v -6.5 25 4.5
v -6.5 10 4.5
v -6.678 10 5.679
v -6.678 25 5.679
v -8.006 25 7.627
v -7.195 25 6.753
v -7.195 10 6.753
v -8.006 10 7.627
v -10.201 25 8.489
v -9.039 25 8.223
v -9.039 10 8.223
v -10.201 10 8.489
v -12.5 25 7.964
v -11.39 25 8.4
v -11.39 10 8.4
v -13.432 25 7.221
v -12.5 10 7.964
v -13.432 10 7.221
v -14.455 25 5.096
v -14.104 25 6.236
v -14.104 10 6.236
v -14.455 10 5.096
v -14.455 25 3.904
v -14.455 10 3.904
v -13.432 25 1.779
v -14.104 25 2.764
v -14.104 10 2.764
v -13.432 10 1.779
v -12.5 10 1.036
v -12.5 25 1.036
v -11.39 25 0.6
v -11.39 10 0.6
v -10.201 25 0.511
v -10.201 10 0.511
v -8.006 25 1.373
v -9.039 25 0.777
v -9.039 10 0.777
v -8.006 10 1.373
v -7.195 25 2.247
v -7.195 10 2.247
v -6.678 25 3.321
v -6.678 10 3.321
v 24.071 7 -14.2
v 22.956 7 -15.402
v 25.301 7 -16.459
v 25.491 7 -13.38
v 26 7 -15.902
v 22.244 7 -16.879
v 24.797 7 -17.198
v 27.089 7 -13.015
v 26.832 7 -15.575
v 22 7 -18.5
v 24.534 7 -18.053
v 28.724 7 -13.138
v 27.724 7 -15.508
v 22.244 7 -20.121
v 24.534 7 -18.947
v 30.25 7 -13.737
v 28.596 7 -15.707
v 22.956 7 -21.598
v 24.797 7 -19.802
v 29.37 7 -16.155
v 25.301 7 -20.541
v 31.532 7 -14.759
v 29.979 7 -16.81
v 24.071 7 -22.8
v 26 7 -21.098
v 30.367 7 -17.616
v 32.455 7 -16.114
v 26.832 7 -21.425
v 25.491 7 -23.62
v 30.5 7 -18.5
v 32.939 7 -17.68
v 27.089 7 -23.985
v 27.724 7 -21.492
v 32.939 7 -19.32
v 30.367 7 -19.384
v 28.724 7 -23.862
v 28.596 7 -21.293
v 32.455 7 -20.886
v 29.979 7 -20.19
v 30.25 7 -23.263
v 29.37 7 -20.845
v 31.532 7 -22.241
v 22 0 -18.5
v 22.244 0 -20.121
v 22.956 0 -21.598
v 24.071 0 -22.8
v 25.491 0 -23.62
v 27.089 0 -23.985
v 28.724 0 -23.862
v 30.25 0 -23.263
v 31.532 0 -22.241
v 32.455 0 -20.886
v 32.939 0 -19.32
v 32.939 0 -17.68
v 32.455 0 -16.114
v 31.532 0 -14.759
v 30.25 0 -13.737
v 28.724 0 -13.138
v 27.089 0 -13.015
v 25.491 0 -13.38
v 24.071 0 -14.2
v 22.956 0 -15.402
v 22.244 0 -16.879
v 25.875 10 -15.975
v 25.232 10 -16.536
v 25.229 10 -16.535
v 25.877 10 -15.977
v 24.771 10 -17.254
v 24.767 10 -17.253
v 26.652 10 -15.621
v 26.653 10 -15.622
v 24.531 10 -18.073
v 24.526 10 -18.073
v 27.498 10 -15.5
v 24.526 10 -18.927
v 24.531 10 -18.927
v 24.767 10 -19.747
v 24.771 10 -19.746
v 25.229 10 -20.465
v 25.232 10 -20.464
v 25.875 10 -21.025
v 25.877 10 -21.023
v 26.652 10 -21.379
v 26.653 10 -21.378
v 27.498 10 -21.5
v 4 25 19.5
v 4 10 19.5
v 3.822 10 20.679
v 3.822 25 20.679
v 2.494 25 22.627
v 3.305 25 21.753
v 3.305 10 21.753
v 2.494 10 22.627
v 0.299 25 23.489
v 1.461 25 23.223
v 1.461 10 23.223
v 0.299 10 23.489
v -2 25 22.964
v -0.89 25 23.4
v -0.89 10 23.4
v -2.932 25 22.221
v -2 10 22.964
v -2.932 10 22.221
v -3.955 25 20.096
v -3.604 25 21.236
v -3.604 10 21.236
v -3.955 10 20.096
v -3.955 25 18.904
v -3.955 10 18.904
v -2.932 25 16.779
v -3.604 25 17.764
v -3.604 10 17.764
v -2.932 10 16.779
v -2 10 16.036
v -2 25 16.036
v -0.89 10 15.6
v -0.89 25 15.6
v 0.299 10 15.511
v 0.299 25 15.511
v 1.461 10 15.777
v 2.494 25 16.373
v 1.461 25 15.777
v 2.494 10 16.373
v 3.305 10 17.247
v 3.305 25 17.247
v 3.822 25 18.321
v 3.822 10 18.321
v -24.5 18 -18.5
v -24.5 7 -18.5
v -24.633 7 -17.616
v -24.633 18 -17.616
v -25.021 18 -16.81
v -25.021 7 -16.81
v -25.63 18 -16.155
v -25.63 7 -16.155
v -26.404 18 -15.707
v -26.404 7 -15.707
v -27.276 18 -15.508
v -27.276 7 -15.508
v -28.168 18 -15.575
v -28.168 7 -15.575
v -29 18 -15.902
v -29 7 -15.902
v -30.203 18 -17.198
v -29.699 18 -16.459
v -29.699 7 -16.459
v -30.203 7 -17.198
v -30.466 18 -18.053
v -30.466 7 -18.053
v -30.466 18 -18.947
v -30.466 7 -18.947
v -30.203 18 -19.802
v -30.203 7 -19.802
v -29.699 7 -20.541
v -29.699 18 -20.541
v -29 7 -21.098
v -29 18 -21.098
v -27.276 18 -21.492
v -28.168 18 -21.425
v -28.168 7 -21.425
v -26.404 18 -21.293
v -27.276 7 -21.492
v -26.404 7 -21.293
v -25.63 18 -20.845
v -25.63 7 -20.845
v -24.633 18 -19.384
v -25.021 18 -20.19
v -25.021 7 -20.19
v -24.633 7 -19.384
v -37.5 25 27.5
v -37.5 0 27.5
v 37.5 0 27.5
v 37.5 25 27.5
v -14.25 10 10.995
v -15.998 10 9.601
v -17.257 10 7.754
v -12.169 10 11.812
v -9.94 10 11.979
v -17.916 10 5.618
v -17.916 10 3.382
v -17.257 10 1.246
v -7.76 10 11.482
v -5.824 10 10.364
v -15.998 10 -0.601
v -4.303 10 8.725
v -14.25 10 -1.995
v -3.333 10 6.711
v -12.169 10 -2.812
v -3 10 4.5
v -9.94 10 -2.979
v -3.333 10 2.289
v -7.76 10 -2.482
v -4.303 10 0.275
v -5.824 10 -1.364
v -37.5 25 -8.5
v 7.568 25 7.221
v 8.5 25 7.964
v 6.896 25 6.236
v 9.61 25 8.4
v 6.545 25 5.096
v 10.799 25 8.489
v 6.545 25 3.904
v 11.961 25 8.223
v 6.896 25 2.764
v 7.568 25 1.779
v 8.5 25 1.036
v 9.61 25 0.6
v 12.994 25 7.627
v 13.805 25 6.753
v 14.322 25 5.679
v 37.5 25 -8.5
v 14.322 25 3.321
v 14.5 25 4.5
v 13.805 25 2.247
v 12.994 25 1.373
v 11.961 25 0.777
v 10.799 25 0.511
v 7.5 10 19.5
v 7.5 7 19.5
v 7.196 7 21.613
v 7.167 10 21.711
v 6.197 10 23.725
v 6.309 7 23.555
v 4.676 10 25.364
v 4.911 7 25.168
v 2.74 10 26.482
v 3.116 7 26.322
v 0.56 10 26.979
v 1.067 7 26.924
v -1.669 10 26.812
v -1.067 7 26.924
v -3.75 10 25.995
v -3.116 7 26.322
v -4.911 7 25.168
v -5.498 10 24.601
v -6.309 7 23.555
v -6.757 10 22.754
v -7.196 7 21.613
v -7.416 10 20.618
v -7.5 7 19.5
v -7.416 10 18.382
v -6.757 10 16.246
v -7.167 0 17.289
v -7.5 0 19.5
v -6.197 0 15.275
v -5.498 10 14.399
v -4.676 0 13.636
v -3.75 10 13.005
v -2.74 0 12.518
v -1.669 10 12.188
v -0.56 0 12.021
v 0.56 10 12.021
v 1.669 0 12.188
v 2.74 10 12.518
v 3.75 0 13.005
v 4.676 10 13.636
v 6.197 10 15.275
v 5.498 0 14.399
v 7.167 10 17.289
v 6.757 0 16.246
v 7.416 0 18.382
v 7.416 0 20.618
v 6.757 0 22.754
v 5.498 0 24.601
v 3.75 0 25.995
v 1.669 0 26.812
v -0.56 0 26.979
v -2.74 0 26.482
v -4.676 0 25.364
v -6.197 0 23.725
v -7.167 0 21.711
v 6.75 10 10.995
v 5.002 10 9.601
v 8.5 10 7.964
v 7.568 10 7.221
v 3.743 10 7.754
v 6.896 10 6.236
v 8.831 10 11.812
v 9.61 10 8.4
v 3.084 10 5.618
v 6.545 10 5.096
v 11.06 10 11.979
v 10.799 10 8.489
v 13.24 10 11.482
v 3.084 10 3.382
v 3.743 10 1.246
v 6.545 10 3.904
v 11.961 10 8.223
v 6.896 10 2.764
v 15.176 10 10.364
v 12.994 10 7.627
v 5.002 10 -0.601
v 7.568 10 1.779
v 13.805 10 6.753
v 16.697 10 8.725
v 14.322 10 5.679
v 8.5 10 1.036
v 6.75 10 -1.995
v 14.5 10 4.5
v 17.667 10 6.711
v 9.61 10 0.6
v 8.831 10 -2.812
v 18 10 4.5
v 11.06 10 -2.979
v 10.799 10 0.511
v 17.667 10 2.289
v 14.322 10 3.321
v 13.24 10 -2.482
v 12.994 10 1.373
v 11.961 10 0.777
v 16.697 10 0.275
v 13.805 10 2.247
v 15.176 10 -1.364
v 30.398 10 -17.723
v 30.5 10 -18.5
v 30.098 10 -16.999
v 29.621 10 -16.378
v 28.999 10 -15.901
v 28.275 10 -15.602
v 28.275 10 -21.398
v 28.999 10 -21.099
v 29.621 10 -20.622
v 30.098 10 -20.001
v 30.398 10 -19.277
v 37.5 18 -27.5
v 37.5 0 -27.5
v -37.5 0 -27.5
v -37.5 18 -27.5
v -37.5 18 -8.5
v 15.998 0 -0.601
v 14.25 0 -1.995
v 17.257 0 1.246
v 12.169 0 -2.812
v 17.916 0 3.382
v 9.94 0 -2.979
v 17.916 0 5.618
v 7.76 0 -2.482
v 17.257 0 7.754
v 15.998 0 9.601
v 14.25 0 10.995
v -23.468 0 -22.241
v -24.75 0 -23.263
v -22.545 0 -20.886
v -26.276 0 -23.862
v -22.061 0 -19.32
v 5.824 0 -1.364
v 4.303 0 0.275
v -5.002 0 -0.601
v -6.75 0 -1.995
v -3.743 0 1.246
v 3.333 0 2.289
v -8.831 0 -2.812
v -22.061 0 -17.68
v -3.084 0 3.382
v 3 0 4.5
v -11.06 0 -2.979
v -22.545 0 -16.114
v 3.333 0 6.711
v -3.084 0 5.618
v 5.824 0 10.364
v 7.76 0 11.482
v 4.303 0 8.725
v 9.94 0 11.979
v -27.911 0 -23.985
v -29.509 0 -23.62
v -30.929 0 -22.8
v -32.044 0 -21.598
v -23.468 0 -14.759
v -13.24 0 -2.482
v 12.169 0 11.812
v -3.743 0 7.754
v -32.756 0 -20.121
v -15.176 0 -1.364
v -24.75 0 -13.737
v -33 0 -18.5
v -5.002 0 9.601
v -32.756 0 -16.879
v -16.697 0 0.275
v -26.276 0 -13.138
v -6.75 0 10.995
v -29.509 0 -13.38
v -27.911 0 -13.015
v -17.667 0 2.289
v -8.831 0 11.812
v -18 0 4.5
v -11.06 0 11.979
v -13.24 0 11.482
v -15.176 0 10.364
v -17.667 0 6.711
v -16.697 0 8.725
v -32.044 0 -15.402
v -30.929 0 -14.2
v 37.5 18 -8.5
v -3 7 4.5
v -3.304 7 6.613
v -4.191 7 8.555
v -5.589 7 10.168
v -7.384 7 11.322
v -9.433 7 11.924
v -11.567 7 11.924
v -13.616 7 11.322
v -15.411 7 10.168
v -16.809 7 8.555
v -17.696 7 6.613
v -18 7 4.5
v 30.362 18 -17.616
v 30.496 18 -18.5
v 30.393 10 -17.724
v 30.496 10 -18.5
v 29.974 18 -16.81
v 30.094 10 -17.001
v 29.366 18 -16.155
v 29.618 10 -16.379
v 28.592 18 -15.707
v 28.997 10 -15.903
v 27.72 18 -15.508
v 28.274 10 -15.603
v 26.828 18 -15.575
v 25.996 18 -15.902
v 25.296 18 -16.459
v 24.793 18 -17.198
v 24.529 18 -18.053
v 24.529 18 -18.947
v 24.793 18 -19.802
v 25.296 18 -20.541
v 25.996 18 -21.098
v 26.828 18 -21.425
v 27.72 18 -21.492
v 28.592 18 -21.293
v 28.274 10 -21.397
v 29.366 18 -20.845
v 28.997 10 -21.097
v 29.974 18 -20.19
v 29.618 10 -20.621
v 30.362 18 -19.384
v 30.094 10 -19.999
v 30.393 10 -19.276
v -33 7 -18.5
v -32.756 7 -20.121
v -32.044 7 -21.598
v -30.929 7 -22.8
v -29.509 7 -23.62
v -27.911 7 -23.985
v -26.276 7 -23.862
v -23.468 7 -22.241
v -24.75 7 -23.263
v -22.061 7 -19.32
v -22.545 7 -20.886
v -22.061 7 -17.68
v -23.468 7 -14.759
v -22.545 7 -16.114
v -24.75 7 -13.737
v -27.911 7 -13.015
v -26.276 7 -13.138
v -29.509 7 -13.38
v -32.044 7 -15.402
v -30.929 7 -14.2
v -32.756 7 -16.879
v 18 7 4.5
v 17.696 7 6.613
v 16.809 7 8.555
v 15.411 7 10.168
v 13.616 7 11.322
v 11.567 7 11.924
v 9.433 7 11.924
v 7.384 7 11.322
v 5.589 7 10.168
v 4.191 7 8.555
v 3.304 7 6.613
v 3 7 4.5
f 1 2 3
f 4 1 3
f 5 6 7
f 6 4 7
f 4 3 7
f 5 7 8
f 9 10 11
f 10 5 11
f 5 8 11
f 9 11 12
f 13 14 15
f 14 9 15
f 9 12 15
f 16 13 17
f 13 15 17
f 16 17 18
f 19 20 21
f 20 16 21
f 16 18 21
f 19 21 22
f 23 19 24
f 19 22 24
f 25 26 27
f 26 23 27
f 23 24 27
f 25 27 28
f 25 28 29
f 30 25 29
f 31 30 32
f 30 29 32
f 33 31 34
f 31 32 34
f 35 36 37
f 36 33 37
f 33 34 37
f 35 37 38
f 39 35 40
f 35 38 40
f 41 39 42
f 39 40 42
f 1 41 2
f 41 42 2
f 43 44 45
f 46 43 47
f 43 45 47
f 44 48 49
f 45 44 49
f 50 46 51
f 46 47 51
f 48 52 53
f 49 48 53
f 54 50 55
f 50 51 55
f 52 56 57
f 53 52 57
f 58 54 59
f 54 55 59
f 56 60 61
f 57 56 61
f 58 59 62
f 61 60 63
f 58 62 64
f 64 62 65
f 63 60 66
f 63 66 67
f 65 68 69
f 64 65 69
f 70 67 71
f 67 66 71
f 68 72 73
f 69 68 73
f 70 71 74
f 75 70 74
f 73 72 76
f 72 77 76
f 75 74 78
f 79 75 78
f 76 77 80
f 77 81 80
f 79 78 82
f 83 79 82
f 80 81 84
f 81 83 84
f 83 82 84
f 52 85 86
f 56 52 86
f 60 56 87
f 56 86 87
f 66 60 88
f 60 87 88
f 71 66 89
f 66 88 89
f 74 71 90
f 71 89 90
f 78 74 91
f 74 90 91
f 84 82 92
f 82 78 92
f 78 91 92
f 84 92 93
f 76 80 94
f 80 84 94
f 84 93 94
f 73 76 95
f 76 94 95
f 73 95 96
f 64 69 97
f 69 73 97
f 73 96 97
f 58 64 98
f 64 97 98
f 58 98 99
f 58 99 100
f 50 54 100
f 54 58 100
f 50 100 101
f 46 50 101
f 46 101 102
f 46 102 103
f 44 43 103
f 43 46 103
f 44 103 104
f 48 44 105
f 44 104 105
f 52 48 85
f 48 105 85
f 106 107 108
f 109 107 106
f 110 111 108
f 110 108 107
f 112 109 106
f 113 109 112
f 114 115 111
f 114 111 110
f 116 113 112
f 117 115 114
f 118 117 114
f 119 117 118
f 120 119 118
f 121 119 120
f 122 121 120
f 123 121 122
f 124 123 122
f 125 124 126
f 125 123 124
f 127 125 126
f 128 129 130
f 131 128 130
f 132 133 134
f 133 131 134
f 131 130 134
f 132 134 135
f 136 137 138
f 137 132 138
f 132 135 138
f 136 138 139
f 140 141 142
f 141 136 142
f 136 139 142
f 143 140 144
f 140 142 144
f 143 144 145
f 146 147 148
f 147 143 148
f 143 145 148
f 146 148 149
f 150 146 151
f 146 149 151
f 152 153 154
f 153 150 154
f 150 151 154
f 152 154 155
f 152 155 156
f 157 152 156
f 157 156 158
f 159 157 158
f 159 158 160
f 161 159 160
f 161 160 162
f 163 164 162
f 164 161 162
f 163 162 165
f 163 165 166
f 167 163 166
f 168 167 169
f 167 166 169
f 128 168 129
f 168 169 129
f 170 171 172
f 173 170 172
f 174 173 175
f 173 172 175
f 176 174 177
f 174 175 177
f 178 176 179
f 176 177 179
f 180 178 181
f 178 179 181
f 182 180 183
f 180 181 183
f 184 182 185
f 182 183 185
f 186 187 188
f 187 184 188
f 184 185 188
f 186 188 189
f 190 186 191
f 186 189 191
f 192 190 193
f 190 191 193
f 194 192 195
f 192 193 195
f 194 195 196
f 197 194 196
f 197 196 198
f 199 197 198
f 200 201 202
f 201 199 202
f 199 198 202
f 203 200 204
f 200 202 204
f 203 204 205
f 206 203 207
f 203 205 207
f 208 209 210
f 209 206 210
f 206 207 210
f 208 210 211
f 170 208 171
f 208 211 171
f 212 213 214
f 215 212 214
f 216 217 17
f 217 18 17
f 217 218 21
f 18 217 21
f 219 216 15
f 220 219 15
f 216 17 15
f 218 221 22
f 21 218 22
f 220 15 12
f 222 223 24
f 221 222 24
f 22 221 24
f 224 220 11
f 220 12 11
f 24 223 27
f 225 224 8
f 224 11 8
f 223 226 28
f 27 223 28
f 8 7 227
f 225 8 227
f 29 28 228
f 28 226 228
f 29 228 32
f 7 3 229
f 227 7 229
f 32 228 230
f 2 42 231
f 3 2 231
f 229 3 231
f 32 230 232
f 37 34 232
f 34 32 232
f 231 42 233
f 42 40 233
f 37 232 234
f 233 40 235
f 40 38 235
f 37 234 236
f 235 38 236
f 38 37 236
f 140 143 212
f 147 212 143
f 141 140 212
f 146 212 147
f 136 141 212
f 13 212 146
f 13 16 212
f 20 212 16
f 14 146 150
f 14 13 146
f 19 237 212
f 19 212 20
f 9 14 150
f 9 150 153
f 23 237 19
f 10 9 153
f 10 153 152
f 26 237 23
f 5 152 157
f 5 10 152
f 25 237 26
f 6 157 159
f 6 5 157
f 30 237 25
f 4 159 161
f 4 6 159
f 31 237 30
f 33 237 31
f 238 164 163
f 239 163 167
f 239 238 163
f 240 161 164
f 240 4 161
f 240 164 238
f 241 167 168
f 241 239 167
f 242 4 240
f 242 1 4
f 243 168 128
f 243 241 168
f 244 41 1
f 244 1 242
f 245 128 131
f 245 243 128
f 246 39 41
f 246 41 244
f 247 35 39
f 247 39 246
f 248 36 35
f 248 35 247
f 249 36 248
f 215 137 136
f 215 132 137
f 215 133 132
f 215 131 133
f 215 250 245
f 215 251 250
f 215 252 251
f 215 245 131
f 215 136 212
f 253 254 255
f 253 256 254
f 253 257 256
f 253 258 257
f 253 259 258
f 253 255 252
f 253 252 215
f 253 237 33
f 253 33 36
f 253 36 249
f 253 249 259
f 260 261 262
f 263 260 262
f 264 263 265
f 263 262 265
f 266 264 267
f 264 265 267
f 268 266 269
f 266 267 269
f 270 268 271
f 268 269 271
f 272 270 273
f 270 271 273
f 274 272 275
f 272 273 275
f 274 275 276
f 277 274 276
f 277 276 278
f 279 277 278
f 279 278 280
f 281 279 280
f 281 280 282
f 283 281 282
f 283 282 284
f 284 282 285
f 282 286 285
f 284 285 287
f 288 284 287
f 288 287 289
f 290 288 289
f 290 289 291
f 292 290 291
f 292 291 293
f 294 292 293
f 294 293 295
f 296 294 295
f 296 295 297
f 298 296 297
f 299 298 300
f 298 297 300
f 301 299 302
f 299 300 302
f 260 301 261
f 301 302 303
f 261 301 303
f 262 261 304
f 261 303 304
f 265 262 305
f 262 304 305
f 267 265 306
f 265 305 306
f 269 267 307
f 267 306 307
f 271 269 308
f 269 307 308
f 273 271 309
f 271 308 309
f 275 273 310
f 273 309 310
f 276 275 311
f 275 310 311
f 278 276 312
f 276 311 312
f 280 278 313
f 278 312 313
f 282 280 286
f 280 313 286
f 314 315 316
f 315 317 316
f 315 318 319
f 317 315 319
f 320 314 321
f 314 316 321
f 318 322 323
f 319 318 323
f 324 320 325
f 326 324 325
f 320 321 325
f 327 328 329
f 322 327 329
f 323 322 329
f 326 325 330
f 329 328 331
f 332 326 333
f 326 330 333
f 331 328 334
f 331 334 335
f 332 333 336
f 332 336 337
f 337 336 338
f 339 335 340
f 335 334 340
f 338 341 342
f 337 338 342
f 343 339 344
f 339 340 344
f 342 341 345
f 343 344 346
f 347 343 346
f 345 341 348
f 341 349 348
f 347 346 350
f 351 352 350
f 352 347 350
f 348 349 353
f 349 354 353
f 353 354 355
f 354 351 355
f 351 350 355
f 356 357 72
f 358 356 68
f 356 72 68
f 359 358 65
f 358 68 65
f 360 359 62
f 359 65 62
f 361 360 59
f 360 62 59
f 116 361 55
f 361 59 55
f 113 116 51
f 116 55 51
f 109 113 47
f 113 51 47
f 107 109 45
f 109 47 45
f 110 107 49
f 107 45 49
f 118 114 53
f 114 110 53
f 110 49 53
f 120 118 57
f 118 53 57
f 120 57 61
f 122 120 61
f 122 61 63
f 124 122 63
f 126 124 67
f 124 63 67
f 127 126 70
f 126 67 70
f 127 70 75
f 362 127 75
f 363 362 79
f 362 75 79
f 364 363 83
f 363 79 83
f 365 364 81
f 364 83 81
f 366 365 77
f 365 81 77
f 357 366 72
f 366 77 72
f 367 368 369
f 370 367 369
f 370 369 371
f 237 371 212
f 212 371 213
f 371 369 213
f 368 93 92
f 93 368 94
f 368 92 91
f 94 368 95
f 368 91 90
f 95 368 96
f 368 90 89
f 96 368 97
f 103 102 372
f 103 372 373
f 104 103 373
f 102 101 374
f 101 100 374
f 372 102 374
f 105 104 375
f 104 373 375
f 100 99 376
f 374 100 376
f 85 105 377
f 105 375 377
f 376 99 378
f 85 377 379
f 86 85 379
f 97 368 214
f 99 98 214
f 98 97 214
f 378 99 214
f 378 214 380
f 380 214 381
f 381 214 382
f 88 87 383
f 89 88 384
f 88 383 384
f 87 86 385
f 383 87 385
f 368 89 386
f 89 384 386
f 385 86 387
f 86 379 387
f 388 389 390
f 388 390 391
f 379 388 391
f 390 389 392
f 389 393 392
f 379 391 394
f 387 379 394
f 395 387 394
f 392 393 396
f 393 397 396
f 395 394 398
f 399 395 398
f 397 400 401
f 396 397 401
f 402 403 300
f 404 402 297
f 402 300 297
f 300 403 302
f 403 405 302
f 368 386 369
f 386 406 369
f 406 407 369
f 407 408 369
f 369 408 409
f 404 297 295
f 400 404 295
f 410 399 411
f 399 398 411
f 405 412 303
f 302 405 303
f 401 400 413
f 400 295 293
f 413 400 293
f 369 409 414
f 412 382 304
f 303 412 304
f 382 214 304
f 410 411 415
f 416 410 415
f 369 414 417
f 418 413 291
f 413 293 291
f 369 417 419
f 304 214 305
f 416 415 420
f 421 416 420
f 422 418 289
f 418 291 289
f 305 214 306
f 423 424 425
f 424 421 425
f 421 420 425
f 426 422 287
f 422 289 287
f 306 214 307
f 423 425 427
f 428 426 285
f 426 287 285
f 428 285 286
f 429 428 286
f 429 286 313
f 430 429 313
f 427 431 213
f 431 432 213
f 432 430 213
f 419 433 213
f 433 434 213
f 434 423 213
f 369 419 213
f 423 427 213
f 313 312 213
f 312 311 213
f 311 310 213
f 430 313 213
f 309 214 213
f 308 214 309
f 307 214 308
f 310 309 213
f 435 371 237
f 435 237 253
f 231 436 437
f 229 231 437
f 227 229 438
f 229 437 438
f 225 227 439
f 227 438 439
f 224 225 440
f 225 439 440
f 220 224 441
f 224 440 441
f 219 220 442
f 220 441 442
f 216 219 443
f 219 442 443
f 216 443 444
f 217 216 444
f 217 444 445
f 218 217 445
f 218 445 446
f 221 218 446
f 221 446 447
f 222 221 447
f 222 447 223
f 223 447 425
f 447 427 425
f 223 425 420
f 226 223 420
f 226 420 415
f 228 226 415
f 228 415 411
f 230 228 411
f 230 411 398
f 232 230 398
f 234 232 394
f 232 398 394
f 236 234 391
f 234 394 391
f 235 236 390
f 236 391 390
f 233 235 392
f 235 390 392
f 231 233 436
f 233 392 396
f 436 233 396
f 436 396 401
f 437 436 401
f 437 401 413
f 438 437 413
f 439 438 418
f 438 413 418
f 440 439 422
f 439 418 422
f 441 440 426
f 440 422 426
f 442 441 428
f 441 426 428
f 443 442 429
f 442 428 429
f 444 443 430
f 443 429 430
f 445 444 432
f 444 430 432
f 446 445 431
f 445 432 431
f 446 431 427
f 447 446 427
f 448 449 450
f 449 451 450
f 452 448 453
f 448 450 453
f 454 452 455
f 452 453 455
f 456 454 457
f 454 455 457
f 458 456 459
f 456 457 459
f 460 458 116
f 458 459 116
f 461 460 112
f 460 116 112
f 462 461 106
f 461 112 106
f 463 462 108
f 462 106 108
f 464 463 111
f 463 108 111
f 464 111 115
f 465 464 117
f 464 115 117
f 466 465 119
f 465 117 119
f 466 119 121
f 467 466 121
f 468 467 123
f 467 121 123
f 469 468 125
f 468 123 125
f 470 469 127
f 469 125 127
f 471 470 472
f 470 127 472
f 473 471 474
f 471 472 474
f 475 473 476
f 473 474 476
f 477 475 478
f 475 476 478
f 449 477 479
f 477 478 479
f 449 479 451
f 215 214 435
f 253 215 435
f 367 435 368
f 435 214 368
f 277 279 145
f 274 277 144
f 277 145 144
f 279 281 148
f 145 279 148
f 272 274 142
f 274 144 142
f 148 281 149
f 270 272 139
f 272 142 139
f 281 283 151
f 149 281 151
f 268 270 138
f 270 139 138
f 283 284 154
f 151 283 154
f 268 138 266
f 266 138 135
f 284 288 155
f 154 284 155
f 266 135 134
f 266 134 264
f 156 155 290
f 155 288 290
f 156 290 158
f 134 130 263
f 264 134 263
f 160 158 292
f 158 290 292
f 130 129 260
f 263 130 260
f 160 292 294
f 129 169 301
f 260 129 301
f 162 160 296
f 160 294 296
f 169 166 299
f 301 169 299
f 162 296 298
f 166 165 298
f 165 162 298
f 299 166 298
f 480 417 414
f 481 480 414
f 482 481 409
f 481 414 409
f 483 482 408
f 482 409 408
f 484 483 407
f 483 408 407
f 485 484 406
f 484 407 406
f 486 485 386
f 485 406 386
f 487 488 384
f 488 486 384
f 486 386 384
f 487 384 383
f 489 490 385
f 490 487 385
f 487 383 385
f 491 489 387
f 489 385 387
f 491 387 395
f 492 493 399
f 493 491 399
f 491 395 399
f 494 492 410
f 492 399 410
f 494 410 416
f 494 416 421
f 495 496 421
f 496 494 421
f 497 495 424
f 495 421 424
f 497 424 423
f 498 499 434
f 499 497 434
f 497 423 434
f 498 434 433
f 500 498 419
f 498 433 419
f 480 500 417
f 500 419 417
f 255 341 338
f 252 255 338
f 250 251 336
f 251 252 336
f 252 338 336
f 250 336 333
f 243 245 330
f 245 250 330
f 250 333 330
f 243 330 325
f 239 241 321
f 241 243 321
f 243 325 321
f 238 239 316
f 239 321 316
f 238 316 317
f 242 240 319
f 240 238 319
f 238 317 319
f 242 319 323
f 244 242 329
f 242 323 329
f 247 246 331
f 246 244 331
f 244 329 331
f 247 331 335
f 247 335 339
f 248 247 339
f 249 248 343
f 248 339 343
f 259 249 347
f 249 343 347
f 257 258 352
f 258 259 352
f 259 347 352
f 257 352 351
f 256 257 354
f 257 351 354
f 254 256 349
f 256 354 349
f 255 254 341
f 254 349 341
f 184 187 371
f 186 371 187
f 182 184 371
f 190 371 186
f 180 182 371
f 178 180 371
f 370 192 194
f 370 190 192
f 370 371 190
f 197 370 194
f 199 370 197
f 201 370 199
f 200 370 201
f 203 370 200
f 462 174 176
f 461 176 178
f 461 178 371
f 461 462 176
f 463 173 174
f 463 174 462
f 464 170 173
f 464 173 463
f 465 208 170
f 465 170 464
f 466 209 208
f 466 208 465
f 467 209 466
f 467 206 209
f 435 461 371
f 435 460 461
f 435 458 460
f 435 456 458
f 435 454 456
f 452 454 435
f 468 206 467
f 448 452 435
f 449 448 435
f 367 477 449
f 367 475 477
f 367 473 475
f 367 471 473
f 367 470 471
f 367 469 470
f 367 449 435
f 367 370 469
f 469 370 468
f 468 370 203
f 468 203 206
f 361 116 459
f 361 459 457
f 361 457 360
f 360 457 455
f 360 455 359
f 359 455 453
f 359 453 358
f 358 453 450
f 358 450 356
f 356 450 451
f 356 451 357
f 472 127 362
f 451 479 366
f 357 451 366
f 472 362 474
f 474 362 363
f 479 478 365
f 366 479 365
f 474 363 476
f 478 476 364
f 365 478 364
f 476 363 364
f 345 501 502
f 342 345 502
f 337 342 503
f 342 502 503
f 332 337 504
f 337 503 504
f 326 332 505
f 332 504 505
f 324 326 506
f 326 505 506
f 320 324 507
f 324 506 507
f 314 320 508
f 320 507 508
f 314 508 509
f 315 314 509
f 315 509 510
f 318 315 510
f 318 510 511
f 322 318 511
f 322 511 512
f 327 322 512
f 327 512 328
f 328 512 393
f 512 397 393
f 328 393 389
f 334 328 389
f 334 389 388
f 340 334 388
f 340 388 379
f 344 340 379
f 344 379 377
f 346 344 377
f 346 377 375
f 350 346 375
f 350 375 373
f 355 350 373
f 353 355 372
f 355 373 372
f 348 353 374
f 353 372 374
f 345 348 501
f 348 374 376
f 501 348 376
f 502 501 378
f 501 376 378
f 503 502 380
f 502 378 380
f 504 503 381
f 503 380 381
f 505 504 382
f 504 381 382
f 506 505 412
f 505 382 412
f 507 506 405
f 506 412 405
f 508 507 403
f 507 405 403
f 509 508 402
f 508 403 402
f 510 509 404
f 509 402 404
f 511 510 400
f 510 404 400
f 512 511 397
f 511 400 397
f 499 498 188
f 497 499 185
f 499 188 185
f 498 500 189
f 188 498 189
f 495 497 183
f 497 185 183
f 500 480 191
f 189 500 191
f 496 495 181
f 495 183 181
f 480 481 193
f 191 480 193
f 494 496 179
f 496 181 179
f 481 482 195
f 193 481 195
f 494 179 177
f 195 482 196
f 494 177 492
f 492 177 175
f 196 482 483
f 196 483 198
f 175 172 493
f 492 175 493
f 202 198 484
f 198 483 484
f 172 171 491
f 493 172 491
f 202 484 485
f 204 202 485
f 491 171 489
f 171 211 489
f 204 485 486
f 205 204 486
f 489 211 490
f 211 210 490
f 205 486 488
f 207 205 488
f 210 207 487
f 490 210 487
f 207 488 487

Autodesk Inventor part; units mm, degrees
ref_plane "YZ Plane" through (0, 0, 0) normal (1, 0, 0) x (0, 1, 0)
ref_plane "XZ Plane" through (0, 0, 0) normal (0, 1, 0) x (-1, 0, 0)
ref_plane "XY Plane" through (0, 0, 0) normal (0, 0, 1) x (1, 0, 0)
sketch "Sketch1" plane through (0, 0, 0) normal (0, 1, 0) x (-1, 0, 0)
  line L0 (-37.5, 27.5) -> (37.5, 27.5)
  line L1 (37.5, 27.5) -> (37.5, -27.5)
  line L2 (37.5, -27.5) -> (-37.5, -27.5)
  line L3 (-37.5, -27.5) -> (-37.5, 27.5)
  line L4 (-37.5, 27.5) -> (37.5, -27.5) construction
  line L5 (37.5, 27.5) -> (-37.5, -27.5) construction
  circle A0 centre (27.5, -18.5) radius 5.5
  circle A1 centre (-27.5, -18.5) radius 5.5
  circle A2 centre (0, 19.5) radius 7.5
  circle A3 centre (10.5, 4.5) radius 7.5
  circle A4 centre (-10.5, 4.5) radius 7.5
  point P0 (0, 0)
  point P1 (0, 27.5)
  dimension "d0" = 75
  dimension "d1" = 55
  dimension "d2" = 11
  dimension "d4" = 11
  dimension "d6" = 55
  dimension "d7" = 10
  dimension "d8" = 10
  dimension "d9" = 15
  dimension "d11" = 15
  dimension "d13" = 15
  dimension "d15" = 23
  dimension "d16" = 8
  dimension "d17" = 21
  dimension "d18" = 10.5
  dimension "d19" = 46
extrude "Extrusion1" add sketch "Sketch1" along normal blind 7
sketch "Sketch2" plane through (0, 7, 0) normal (0, 1, 0) x (1, 0, 0)
  line L0 (37.5, 27.5) -> (-37.5, 27.5) projected
  line L1 (37.5, -27.5) -> (-37.5, -27.5)
  line L2 (-37.5, -27.5) -> (-37.5, 27.5)
  line L3 (-37.5, 27.5) -> (37.5, 27.5)
  line L4 (37.5, 27.5) -> (37.5, -27.5)
  line L5 (37.5, -27.5) -> (-37.5, 27.5) construction
  line L6 (-37.5, -27.5) -> (37.5, 27.5) construction
  circle A0 centre (-27.5, 18.5) radius 3
  circle A1 centre (27.5, 18.5) radius 3
  circle A2 centre (-10.5, -4.5) radius 7.5
  circle A3 centre (10.5, -4.5) radius 7.5
  circle A4 centre (0, -19.5) radius 7.5
  circle A5 centre (0, -19.5) radius 4
  circle A6 centre (-10.5, -4.5) radius 4
  circle A7 centre (10.5, -4.5) radius 4
  line L7 (-37.5, -27.5) -> (37.5, -27.5) projected
  point P0 (0, 0)
  point P1 (0, -27.5)
  point P2 (0, -27.5)
  dimension "d22" = 6
  dimension "d23" = 6
  dimension "d24" = 15
  dimension "d25" = 15
  dimension "d26" = 15
  dimension "d27" = 8
  dimension "d28" = 8
  dimension "d29" = 8
  dimension "d30" = 55
  dimension "d31" = 10
  dimension "d32" = 10
  dimension "d33" = 46
  dimension "d34" = 23
  dimension "d35" = 8
  dimension "d36" = 10.5
  dimension "d37" = 10.5
  dimension "d38" = 21
extrude "Extrusion2" add sketch "Sketch2" along normal blind 3 contours L4 L1 L2 L0
sketch "Sketch3" plane through (0, 10, 0) normal (0, 1, 0) x (1, 0, 0)
  line L0 (37.5, 27.5) -> (-37.5, 27.5) projected
  line L1 (37.5, -27.5) -> (-37.5, -27.5)
  line L2 (-37.5, -27.5) -> (-37.5, 27.5)
  line L3 (-37.5, 27.5) -> (37.5, 27.5)
  line L4 (37.5, 27.5) -> (37.5, -27.5)
  line L5 (37.5, -27.5) -> (-37.5, 27.5) construction
  line L6 (-37.5, -27.5) -> (37.5, 27.5) construction
  circle A0 centre (-27.5, 18.5) radius 3 projected
  circle A1 centre (-27.5, 18.5) radius 3
  circle A2 centre (27.4955, 18.5) radius 3
  circle A3 centre (-10.5, -4.5) radius 4
  circle A4 centre (10.5, -4.5) radius 4
  circle A5 centre (0, -19.5) radius 4
  line L7 (-37.5, -27.5) -> (37.5, -27.5) projected
  point P0 (0, 0)
  point P1 (0, -27.5)
  point P2 (0, -27.5)
  dimension "d41" = 6
  dimension "d42" = 8
  dimension "d43" = 8
  dimension "d44" = 8
  dimension "d45" = 8
  dimension "d46" = 23
  dimension "d47" = 10.5
  dimension "d48" = 10.5
extrude "Extrusion3" add sketch "Sketch3" along normal blind 8
sketch "Sketch4" plane through (0, 18, 0) normal (0, 1, 0) x (1, 0, 0)
  line L0 (-37.5, 8.5) -> (37.5, 8.5)
  line L1 (-37.5, -27.5) -> (37.5, -27.5) projected
  line L2 (-37.5, 27.5) -> (-37.5, -27.5) projected
  line L3 (-37.5, 8.5) -> (-37.5, -27.5)
  line L4 (-37.5, -27.5) -> (37.5, -27.5) projected
  line L5 (-37.5, -27.5) -> (37.5, -27.5)
  line L6 (37.5, -27.5) -> (37.5, 8.5)
  circle A0 centre (-10.5, -4.5) radius 4
  circle A1 centre (10.5, -4.5) radius 4
  circle A2 centre (0, -19.5) radius 4
  point P0 (0, 0)
  point P1 (0, -27.5)
  dimension "d51" = 75
  dimension "d52" = 36
  dimension "d53" = 8
  dimension "d54" = 8
  dimension "d55" = 8
  dimension "d56" = 8
  dimension "d57" = 23
  dimension "d58" = 21
  dimension "d59" = 10.5
extrude "Extrusion4" add sketch "Sketch4" along normal blind 7
properties part number "Feste Backe" material "Steel"
